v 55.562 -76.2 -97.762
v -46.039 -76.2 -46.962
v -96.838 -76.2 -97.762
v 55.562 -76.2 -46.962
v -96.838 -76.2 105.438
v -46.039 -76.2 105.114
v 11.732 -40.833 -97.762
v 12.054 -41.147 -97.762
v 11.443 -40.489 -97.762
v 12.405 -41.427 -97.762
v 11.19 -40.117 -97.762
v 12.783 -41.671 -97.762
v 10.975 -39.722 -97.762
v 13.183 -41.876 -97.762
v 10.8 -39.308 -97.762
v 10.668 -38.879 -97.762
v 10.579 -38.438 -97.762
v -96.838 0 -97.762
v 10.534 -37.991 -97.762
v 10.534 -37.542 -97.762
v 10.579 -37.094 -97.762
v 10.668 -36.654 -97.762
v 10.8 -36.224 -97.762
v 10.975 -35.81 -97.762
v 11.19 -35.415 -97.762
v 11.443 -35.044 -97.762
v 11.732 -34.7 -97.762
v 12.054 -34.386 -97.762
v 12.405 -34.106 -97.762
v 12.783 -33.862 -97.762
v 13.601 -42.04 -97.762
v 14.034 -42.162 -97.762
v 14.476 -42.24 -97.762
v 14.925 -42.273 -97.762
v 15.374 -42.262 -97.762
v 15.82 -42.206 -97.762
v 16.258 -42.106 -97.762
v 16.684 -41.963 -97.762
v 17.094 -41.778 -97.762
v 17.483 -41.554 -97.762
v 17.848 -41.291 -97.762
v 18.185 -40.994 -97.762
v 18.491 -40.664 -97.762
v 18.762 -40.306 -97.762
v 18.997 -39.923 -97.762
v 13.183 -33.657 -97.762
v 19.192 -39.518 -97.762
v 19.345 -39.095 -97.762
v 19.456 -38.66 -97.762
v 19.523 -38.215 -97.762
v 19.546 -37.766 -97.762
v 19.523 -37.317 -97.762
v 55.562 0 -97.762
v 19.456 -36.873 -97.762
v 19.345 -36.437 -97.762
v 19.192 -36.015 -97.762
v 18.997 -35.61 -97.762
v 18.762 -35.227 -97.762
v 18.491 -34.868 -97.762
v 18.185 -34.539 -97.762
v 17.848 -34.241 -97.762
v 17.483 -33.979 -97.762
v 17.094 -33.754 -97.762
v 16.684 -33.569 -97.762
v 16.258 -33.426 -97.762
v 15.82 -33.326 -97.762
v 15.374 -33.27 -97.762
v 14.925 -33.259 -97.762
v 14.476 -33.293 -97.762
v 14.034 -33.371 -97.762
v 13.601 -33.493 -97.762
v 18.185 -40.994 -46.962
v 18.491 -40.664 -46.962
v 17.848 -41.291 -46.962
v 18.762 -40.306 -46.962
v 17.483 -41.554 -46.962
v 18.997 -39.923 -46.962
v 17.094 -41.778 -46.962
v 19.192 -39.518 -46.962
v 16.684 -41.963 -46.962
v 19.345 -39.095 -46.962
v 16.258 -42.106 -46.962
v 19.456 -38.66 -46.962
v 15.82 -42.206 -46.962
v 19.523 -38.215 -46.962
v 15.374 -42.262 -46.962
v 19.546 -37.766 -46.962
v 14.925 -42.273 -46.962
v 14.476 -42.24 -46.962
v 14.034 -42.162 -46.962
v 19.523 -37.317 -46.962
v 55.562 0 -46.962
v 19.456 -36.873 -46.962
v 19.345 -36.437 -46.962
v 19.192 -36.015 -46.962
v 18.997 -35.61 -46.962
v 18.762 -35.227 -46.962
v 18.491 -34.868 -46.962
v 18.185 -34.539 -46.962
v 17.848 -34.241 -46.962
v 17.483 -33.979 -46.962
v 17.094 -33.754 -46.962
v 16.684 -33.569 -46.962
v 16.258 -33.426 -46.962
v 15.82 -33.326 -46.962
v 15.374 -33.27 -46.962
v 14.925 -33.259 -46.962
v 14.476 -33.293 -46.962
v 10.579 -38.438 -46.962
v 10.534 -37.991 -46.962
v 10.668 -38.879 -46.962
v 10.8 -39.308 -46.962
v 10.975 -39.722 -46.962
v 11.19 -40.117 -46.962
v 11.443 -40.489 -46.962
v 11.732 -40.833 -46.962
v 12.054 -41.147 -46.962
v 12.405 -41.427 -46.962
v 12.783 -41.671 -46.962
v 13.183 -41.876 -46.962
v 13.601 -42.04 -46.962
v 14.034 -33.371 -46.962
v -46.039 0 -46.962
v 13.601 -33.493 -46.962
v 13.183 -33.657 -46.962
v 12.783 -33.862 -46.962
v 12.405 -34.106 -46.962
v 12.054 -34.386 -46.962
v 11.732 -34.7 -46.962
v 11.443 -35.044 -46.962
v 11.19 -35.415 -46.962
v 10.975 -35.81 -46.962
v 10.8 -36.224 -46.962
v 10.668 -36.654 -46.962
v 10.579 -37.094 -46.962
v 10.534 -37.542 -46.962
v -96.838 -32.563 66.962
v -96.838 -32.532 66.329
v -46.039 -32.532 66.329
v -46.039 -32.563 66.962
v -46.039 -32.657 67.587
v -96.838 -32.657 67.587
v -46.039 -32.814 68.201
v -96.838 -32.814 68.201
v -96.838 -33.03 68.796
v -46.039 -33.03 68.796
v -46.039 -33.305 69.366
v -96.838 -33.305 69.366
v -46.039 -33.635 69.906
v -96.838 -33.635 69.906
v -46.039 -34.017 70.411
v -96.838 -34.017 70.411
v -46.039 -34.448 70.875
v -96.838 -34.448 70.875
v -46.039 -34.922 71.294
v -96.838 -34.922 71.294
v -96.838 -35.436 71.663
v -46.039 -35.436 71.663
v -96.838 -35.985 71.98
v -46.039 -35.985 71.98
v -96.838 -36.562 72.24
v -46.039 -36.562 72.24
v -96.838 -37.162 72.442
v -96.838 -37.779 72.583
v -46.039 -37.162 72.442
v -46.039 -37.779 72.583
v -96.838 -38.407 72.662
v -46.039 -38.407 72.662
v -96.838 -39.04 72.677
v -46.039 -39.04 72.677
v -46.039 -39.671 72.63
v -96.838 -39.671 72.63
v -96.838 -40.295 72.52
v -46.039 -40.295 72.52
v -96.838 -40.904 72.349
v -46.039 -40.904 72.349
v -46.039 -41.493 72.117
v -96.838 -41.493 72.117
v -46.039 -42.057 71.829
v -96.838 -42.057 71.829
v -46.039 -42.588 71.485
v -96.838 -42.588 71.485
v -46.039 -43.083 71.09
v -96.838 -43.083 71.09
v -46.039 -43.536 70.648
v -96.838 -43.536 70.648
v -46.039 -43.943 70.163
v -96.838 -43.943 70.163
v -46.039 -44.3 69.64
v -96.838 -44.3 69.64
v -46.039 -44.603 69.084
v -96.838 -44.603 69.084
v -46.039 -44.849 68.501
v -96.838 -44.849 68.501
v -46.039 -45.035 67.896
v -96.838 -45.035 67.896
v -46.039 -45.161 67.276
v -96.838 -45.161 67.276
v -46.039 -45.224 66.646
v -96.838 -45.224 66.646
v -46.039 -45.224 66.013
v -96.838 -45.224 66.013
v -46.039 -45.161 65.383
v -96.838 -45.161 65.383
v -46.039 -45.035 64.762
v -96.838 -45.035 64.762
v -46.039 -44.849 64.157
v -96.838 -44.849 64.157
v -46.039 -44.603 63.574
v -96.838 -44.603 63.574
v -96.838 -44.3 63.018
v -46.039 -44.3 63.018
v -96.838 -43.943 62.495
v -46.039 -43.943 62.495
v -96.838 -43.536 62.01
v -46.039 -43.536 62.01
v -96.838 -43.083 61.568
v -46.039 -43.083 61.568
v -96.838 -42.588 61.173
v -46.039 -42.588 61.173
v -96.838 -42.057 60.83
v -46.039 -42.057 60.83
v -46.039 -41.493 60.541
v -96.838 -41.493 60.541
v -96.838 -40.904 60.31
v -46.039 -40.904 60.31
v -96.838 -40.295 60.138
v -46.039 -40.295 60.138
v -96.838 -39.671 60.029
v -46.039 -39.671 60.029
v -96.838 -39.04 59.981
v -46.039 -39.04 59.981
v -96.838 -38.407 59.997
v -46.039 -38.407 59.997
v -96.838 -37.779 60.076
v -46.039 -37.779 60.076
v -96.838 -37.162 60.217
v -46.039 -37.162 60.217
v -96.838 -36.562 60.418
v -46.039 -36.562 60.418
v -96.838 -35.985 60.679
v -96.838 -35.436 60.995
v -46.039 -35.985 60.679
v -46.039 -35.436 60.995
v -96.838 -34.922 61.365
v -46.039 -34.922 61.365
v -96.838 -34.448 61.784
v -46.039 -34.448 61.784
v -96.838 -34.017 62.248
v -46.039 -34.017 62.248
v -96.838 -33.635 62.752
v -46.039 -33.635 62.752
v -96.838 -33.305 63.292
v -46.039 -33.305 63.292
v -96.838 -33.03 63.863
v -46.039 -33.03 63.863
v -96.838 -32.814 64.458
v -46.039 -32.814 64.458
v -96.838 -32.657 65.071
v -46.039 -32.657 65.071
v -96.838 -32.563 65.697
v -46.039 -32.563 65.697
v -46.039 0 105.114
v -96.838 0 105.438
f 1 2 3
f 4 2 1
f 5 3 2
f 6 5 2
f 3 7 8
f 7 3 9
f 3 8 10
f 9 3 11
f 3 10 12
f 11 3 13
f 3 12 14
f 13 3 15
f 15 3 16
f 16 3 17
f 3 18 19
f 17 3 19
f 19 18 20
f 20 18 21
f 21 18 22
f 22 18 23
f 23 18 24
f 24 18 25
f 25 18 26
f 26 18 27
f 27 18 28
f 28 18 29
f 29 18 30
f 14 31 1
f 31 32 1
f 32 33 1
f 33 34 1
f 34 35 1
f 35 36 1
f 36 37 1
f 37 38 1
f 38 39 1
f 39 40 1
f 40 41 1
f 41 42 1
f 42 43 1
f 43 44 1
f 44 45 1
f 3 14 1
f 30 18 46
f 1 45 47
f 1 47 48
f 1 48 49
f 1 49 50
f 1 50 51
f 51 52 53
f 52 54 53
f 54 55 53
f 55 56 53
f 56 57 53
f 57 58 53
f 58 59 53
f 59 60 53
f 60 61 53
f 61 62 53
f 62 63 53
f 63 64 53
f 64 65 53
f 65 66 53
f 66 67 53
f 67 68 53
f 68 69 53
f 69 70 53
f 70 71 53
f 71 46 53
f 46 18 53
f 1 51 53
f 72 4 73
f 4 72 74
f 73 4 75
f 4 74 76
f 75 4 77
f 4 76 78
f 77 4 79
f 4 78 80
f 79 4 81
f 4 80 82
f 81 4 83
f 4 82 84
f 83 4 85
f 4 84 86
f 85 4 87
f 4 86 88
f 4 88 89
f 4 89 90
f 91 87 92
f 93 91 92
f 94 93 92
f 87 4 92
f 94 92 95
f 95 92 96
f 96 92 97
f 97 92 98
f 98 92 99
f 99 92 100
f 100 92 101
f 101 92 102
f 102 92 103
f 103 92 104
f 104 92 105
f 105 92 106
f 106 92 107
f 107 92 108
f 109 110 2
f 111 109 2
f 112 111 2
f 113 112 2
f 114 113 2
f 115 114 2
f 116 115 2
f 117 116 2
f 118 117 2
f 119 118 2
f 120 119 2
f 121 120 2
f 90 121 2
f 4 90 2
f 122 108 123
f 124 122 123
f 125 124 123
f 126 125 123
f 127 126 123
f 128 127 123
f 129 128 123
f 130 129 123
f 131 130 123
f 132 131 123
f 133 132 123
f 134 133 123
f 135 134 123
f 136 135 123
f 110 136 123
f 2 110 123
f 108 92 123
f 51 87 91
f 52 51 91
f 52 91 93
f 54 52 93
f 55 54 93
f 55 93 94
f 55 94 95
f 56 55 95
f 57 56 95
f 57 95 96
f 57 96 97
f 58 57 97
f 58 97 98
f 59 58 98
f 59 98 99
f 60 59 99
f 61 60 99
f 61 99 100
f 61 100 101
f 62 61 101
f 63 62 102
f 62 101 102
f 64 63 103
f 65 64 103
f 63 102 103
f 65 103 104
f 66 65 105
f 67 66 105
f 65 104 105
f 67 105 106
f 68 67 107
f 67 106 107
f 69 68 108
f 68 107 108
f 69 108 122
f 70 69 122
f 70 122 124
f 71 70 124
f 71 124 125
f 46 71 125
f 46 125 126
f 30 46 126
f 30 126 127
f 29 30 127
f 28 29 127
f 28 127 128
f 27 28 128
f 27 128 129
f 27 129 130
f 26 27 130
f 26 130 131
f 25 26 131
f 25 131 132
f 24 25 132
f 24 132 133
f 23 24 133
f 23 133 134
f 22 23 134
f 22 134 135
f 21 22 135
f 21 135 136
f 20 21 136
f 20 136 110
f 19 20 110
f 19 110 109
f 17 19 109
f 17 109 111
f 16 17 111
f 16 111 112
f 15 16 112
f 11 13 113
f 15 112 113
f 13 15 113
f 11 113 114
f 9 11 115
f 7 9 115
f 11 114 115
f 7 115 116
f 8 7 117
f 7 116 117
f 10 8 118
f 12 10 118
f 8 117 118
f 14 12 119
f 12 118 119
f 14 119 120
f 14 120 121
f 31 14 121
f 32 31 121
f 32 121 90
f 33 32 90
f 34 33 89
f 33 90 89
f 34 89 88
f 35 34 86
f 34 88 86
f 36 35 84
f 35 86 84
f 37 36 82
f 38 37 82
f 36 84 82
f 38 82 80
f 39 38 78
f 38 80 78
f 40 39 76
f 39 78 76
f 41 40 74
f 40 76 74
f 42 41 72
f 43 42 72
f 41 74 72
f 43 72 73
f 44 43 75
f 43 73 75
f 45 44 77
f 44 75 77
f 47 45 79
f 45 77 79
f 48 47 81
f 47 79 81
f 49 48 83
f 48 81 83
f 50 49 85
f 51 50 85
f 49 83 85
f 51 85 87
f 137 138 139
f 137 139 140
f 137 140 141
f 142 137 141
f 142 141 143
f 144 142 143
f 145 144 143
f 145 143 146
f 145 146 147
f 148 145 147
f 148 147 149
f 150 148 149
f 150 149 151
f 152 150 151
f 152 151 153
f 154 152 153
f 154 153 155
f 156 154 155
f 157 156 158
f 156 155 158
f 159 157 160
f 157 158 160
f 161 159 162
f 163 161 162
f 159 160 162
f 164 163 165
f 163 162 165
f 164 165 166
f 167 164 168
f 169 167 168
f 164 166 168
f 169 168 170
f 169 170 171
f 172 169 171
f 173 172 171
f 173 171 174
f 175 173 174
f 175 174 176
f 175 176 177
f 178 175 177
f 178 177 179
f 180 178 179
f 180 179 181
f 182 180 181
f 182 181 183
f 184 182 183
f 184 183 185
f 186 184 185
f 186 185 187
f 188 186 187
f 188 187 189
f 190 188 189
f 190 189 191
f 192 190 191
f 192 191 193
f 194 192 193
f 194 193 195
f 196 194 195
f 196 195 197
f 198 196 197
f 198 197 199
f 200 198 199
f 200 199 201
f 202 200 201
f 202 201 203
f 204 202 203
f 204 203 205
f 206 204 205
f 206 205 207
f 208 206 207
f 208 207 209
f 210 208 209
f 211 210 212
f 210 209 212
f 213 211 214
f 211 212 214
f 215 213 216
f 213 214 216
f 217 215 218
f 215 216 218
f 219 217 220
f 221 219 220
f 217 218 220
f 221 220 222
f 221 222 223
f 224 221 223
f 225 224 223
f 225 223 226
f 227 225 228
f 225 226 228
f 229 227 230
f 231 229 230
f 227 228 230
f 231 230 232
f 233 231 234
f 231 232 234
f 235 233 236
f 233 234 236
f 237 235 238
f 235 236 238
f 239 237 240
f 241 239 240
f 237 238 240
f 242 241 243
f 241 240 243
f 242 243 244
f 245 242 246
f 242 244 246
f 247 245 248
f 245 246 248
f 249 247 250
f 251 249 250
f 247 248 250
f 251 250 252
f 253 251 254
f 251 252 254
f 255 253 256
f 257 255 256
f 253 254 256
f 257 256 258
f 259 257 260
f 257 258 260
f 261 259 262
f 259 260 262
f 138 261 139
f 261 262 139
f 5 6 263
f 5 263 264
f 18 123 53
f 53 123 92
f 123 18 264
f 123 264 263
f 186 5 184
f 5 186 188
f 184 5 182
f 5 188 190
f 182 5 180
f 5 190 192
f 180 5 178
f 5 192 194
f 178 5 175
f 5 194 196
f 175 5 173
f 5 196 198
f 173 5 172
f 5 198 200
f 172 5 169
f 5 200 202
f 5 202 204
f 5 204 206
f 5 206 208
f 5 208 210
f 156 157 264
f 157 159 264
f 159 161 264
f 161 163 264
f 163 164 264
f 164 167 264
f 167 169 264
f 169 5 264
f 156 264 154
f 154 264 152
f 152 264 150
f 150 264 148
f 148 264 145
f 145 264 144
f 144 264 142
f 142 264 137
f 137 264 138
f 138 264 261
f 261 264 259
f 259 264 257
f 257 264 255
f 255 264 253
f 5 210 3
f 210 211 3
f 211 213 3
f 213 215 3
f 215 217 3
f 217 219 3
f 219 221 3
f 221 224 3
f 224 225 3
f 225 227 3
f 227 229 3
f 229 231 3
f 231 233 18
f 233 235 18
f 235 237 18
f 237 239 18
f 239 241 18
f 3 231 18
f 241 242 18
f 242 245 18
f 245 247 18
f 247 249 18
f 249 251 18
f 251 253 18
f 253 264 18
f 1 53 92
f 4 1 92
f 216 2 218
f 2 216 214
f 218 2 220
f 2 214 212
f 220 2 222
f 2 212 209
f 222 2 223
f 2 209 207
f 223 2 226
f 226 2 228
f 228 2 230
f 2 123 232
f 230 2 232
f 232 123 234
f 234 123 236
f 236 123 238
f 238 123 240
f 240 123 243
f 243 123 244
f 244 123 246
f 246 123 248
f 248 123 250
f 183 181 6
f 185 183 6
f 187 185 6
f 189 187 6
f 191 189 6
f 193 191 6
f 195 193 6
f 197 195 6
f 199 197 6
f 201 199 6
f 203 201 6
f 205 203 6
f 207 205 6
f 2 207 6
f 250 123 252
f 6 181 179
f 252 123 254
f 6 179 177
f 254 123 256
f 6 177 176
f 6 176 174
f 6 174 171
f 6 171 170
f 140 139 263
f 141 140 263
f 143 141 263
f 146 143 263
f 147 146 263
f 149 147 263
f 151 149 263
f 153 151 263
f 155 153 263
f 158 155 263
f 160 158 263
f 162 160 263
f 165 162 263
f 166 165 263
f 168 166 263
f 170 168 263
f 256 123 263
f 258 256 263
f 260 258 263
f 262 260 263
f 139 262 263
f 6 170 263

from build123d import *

# Parameters (mm, degrees)
F1_DEPTH = 76.2
F2_R     = 4.5085
F3_DEPTH = 92.761762
F4_R     = 6.35
F5_DEPTH = 118.672617


with BuildPart() as f1:
    # F0 (on Front) → F1 (new body)
    with BuildSketch(Plane.XZ):
        Polygon((-46.039158, 105.114406), (-96.838128, 105.437962), (-96.838128, -97.762038), (55.561872, -97.762038), (55.561872, -46.962038), (-46.039158, -46.962038), align=None)
    extrude(amount=F1_DEPTH)

    # F2 (on face) → F3 (cut)
    with BuildSketch(Plane.XY.offset(-46.962038)):
        with Locations((15.037069, -37.766326)):
            Circle(F2_R)
    extrude(amount=-F3_DEPTH, mode=Mode.SUBTRACT)

    # F4 (on face) → F5 (cut)
    with BuildSketch(Plane.YZ.offset(-46.039158)):
        with Locations((-38.88151, 66.329271)):
            Circle(F4_R)
    extrude(amount=-F5_DEPTH, mode=Mode.SUBTRACT)


solid = f1.part
